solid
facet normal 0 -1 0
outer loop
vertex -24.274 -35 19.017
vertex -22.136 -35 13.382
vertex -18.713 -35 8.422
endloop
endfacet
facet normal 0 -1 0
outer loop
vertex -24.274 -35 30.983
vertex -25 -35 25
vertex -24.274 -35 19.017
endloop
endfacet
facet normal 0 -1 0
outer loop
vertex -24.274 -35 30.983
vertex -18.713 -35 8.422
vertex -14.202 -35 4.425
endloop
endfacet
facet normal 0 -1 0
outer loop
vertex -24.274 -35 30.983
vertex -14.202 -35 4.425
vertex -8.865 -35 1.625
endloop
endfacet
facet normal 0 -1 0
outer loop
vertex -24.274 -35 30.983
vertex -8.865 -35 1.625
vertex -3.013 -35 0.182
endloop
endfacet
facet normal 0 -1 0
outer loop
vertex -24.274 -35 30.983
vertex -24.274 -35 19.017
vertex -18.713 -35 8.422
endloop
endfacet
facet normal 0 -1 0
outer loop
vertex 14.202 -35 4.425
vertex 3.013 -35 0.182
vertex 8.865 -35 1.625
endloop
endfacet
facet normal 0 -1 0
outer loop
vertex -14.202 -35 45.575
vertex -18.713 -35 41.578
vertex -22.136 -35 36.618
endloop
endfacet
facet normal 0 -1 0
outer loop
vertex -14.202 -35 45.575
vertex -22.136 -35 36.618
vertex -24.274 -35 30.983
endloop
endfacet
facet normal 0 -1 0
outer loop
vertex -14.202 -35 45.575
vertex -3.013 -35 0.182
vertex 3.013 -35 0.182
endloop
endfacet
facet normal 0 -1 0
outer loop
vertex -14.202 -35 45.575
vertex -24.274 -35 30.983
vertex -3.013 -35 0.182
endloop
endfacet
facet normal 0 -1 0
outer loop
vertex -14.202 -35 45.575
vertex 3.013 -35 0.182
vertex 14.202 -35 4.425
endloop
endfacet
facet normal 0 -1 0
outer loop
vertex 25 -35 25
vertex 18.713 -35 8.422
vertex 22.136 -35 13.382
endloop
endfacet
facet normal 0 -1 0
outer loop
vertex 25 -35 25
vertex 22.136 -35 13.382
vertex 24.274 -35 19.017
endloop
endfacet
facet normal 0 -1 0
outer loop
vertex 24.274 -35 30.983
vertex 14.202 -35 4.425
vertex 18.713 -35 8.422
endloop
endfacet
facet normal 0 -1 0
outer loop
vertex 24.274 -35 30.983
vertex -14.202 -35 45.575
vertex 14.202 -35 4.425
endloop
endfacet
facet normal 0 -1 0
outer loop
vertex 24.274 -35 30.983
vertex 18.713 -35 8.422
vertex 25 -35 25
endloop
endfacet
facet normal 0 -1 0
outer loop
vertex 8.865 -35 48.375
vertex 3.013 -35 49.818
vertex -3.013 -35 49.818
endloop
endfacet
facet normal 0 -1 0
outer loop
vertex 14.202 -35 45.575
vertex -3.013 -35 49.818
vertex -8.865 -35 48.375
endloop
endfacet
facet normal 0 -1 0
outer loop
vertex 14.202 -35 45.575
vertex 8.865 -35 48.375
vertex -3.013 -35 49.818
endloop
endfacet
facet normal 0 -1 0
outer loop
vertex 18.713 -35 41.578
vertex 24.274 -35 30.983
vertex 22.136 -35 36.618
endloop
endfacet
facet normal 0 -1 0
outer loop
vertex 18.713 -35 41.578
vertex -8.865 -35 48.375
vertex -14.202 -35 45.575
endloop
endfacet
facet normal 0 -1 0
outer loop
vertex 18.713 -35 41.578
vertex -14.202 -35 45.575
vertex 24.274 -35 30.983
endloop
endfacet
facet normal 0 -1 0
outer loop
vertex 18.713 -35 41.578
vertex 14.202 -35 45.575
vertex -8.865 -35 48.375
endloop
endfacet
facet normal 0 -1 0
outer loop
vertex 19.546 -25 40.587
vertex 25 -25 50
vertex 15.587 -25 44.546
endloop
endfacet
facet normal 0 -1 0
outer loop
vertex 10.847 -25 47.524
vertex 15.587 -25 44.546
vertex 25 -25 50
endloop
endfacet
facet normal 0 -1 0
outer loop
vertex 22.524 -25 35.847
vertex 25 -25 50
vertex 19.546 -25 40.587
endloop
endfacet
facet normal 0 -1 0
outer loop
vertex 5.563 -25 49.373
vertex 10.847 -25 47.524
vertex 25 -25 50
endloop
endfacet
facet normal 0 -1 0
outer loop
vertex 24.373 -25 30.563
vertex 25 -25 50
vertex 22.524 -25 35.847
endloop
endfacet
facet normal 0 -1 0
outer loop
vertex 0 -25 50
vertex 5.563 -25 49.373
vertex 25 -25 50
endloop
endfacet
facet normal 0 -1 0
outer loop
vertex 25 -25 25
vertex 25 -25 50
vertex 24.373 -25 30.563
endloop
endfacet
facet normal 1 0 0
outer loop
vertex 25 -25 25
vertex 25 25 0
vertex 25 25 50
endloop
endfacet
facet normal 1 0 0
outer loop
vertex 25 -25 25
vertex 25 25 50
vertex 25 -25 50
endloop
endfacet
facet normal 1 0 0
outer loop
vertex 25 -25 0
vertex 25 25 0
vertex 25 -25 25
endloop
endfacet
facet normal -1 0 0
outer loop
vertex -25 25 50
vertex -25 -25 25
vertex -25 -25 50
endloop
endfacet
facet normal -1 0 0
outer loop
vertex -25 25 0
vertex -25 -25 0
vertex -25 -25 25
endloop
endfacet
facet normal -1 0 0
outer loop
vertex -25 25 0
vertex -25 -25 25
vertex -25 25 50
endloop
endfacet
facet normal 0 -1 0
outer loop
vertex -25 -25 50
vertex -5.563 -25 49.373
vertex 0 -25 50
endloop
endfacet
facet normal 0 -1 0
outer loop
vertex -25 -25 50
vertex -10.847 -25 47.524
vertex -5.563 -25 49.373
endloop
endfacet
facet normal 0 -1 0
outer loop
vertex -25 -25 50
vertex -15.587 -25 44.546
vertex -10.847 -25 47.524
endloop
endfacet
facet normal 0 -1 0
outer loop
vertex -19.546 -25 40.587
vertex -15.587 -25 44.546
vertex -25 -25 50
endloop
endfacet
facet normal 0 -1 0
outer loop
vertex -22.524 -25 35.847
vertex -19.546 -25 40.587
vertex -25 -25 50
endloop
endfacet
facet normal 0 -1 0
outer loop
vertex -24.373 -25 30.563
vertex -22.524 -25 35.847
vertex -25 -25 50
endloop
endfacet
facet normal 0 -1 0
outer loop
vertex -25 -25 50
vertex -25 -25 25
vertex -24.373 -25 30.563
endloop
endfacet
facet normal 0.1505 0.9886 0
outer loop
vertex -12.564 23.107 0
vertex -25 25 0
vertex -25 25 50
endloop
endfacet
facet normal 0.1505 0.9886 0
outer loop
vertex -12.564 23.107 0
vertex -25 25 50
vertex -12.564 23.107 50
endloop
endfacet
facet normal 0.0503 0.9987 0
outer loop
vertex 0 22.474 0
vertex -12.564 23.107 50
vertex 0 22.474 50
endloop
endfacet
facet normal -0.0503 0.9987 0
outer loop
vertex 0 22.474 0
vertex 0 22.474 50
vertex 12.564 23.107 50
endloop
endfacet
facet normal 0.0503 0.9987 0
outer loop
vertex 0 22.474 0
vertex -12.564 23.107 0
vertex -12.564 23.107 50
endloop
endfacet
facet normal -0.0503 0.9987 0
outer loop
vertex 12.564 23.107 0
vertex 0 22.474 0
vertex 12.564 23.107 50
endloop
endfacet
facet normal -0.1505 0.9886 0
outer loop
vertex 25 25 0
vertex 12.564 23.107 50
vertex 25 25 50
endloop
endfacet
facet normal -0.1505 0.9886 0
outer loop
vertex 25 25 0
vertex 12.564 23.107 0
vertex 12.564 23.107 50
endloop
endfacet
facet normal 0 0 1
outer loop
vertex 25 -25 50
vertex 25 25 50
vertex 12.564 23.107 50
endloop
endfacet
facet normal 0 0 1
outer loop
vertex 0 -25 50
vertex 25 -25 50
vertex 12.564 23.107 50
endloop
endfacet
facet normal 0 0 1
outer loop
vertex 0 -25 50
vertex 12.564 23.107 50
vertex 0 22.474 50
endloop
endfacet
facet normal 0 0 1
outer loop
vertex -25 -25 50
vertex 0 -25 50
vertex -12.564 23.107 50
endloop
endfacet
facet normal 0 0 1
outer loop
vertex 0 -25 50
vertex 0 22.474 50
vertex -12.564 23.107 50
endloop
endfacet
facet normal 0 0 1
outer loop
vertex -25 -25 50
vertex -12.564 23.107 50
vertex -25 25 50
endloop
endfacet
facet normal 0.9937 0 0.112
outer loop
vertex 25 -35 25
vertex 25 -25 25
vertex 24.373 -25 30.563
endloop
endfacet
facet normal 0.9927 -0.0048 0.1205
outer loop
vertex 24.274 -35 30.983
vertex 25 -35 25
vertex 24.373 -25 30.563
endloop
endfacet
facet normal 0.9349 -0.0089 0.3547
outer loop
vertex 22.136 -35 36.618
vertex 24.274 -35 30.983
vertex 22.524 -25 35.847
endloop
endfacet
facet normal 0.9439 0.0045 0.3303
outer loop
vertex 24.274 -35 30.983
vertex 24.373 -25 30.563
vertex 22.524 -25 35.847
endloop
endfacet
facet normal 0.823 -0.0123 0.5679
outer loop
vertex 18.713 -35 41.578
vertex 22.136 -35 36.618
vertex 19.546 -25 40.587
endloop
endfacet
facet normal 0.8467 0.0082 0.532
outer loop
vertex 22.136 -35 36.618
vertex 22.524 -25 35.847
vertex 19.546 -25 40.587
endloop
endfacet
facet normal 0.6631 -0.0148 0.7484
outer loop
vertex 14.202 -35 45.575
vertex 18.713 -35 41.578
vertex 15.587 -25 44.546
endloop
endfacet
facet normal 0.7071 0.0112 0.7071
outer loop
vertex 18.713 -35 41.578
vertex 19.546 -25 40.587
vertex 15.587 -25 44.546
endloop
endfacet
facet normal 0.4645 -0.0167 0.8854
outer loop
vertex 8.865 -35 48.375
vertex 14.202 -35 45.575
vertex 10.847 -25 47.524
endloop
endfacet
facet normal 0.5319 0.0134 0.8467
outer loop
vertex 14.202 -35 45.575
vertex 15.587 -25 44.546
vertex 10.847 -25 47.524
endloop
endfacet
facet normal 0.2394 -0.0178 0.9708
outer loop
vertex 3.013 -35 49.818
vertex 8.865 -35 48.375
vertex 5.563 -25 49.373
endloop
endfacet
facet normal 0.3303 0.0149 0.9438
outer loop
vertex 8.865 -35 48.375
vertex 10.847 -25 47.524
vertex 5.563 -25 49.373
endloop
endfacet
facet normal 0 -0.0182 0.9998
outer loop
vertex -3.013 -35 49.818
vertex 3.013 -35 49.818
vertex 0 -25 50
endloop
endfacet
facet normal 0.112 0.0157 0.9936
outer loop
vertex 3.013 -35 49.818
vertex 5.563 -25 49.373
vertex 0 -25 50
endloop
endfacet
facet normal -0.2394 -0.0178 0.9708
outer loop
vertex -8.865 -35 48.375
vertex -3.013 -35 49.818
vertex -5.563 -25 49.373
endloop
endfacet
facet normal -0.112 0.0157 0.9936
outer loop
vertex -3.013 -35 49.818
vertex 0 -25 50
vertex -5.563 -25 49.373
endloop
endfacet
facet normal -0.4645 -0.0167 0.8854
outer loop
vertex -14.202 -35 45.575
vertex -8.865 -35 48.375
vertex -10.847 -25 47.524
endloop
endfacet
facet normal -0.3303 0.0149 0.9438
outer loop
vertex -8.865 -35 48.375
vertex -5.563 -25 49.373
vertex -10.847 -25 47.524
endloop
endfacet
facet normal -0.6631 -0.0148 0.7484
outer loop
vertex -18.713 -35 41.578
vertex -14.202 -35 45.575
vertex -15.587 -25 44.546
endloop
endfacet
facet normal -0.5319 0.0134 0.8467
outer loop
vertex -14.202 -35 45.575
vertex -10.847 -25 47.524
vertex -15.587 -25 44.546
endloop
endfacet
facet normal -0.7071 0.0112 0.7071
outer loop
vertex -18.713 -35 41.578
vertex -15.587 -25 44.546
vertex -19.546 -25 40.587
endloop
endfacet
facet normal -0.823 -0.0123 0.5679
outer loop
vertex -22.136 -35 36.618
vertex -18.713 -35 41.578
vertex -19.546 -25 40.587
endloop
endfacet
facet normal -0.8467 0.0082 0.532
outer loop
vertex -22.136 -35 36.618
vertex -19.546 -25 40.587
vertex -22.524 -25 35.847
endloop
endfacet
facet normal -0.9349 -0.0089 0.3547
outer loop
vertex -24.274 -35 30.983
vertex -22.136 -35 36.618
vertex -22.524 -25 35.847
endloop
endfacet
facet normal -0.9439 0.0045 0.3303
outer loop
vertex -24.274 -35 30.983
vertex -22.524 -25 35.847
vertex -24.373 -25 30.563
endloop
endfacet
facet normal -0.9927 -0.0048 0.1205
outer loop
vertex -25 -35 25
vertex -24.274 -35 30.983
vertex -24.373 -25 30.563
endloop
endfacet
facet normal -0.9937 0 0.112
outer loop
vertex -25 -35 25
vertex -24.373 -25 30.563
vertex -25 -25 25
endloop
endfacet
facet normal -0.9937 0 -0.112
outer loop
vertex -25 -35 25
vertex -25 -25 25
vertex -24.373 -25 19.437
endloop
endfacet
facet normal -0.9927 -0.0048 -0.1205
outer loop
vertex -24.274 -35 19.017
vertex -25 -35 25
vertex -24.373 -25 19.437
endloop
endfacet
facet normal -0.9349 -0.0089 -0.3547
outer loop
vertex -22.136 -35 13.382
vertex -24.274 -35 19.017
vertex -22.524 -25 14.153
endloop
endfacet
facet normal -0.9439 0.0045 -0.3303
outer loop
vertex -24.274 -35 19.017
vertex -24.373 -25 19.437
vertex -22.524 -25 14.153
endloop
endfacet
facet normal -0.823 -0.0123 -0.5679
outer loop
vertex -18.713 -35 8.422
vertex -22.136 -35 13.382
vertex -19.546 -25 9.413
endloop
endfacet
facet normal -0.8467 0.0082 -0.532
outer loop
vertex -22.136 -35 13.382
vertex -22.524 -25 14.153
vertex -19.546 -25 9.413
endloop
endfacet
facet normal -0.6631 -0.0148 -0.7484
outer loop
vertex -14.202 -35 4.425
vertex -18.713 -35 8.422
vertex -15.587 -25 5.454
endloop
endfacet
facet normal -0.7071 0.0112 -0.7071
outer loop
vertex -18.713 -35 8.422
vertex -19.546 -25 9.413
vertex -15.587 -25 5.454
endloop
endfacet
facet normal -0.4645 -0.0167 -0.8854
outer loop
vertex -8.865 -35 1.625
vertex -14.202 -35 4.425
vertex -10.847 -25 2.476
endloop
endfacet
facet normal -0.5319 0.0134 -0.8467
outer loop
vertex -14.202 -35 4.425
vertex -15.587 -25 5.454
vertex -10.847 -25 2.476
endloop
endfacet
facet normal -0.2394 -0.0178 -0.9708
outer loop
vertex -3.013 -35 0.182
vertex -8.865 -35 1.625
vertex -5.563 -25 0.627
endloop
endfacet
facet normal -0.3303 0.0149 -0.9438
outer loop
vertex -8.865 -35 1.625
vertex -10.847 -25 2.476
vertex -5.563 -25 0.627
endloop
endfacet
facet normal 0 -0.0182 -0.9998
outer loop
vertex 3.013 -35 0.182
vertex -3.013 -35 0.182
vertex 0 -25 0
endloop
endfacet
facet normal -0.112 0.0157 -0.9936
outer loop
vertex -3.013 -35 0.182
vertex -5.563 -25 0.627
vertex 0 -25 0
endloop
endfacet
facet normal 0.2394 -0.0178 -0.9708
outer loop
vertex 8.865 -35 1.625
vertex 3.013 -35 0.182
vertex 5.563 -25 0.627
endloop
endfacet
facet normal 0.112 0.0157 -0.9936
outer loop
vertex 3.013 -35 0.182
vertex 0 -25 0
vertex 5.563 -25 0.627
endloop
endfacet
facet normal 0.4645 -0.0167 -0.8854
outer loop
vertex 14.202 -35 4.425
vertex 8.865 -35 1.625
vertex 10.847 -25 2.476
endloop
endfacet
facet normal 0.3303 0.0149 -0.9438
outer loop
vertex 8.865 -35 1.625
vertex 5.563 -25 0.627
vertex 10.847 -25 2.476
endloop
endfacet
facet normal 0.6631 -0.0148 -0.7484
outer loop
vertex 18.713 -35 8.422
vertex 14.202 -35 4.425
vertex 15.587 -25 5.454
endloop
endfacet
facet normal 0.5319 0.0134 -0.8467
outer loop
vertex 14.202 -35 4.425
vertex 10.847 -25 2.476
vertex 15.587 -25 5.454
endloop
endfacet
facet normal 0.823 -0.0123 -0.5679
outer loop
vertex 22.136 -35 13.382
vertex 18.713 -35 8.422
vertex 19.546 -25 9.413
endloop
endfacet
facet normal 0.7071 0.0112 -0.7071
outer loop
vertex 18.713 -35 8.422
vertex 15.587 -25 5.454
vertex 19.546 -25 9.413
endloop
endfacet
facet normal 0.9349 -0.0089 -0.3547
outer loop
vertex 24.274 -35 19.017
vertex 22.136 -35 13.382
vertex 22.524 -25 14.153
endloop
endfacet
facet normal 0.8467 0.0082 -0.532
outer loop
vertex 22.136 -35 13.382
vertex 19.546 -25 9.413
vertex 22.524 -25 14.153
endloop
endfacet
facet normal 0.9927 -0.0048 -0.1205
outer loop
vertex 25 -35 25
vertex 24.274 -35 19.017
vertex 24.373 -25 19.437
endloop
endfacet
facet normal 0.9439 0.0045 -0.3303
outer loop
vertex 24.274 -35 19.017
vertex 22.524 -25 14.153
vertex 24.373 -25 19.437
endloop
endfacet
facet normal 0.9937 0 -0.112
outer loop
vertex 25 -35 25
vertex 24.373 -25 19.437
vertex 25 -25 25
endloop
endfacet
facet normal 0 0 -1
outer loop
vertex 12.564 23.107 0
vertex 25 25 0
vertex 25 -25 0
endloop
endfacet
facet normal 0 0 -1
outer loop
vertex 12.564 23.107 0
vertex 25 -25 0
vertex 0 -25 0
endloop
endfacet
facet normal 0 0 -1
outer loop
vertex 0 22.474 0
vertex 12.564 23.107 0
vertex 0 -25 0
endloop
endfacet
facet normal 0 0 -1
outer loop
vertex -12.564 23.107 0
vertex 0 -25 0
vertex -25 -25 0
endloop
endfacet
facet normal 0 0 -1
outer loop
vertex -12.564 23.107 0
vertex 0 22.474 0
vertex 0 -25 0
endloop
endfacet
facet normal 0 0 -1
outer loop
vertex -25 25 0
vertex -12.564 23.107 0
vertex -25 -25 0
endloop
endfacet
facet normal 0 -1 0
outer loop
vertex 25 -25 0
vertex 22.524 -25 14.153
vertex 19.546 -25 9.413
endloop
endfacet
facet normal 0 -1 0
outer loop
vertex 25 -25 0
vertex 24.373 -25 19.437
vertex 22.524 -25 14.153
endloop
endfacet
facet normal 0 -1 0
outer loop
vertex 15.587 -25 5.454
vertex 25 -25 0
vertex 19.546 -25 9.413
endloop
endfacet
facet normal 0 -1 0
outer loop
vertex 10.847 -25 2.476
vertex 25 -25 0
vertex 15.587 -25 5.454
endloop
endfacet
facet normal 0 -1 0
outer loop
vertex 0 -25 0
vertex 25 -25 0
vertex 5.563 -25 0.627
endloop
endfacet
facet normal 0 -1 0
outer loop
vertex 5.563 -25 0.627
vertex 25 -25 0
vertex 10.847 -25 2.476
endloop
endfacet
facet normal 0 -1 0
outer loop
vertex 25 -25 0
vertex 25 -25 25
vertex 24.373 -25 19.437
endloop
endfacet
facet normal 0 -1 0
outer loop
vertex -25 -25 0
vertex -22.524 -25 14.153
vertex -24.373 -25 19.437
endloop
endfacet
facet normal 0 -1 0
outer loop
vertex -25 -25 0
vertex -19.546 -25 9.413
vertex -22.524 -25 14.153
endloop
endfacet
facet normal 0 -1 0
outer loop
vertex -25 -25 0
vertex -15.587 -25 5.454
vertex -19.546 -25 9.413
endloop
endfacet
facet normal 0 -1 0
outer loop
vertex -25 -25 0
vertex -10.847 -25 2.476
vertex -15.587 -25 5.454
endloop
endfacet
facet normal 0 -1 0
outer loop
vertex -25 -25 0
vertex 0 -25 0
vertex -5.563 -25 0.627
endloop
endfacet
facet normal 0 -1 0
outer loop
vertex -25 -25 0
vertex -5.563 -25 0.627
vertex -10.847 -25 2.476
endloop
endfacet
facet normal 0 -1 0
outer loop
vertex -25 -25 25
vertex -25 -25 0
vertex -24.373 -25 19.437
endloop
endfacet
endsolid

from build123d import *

# Parameters (mm, degrees)
BOSS_EXTRUDE1_DEPTH = 50
SKETCH2_R           = 25
BOSS_EXTRUDE2_DEPTH = 10


with BuildPart() as part:
    # Sketch1 → Boss-Extrude1 (new body)
    with BuildSketch(Plane.XY):
        with BuildLine():
            Line((25, 25), (25, -25))
            Line((25, -25), (-25, -25))
            Line((-25, -25), (-25, 25))
            ThreePointArc((-25, 25), (0, 22.474363409), (25, 25))
        make_face()
    extrude(amount=BOSS_EXTRUDE1_DEPTH)

    # Sketch2 → Boss-Extrude2 (add)
    with BuildSketch(Plane.XZ.offset(25)):
        with Locations((0, 25)):
            Circle(SKETCH2_R)
    extrude(amount=BOSS_EXTRUDE2_DEPTH)


solid = part.part
